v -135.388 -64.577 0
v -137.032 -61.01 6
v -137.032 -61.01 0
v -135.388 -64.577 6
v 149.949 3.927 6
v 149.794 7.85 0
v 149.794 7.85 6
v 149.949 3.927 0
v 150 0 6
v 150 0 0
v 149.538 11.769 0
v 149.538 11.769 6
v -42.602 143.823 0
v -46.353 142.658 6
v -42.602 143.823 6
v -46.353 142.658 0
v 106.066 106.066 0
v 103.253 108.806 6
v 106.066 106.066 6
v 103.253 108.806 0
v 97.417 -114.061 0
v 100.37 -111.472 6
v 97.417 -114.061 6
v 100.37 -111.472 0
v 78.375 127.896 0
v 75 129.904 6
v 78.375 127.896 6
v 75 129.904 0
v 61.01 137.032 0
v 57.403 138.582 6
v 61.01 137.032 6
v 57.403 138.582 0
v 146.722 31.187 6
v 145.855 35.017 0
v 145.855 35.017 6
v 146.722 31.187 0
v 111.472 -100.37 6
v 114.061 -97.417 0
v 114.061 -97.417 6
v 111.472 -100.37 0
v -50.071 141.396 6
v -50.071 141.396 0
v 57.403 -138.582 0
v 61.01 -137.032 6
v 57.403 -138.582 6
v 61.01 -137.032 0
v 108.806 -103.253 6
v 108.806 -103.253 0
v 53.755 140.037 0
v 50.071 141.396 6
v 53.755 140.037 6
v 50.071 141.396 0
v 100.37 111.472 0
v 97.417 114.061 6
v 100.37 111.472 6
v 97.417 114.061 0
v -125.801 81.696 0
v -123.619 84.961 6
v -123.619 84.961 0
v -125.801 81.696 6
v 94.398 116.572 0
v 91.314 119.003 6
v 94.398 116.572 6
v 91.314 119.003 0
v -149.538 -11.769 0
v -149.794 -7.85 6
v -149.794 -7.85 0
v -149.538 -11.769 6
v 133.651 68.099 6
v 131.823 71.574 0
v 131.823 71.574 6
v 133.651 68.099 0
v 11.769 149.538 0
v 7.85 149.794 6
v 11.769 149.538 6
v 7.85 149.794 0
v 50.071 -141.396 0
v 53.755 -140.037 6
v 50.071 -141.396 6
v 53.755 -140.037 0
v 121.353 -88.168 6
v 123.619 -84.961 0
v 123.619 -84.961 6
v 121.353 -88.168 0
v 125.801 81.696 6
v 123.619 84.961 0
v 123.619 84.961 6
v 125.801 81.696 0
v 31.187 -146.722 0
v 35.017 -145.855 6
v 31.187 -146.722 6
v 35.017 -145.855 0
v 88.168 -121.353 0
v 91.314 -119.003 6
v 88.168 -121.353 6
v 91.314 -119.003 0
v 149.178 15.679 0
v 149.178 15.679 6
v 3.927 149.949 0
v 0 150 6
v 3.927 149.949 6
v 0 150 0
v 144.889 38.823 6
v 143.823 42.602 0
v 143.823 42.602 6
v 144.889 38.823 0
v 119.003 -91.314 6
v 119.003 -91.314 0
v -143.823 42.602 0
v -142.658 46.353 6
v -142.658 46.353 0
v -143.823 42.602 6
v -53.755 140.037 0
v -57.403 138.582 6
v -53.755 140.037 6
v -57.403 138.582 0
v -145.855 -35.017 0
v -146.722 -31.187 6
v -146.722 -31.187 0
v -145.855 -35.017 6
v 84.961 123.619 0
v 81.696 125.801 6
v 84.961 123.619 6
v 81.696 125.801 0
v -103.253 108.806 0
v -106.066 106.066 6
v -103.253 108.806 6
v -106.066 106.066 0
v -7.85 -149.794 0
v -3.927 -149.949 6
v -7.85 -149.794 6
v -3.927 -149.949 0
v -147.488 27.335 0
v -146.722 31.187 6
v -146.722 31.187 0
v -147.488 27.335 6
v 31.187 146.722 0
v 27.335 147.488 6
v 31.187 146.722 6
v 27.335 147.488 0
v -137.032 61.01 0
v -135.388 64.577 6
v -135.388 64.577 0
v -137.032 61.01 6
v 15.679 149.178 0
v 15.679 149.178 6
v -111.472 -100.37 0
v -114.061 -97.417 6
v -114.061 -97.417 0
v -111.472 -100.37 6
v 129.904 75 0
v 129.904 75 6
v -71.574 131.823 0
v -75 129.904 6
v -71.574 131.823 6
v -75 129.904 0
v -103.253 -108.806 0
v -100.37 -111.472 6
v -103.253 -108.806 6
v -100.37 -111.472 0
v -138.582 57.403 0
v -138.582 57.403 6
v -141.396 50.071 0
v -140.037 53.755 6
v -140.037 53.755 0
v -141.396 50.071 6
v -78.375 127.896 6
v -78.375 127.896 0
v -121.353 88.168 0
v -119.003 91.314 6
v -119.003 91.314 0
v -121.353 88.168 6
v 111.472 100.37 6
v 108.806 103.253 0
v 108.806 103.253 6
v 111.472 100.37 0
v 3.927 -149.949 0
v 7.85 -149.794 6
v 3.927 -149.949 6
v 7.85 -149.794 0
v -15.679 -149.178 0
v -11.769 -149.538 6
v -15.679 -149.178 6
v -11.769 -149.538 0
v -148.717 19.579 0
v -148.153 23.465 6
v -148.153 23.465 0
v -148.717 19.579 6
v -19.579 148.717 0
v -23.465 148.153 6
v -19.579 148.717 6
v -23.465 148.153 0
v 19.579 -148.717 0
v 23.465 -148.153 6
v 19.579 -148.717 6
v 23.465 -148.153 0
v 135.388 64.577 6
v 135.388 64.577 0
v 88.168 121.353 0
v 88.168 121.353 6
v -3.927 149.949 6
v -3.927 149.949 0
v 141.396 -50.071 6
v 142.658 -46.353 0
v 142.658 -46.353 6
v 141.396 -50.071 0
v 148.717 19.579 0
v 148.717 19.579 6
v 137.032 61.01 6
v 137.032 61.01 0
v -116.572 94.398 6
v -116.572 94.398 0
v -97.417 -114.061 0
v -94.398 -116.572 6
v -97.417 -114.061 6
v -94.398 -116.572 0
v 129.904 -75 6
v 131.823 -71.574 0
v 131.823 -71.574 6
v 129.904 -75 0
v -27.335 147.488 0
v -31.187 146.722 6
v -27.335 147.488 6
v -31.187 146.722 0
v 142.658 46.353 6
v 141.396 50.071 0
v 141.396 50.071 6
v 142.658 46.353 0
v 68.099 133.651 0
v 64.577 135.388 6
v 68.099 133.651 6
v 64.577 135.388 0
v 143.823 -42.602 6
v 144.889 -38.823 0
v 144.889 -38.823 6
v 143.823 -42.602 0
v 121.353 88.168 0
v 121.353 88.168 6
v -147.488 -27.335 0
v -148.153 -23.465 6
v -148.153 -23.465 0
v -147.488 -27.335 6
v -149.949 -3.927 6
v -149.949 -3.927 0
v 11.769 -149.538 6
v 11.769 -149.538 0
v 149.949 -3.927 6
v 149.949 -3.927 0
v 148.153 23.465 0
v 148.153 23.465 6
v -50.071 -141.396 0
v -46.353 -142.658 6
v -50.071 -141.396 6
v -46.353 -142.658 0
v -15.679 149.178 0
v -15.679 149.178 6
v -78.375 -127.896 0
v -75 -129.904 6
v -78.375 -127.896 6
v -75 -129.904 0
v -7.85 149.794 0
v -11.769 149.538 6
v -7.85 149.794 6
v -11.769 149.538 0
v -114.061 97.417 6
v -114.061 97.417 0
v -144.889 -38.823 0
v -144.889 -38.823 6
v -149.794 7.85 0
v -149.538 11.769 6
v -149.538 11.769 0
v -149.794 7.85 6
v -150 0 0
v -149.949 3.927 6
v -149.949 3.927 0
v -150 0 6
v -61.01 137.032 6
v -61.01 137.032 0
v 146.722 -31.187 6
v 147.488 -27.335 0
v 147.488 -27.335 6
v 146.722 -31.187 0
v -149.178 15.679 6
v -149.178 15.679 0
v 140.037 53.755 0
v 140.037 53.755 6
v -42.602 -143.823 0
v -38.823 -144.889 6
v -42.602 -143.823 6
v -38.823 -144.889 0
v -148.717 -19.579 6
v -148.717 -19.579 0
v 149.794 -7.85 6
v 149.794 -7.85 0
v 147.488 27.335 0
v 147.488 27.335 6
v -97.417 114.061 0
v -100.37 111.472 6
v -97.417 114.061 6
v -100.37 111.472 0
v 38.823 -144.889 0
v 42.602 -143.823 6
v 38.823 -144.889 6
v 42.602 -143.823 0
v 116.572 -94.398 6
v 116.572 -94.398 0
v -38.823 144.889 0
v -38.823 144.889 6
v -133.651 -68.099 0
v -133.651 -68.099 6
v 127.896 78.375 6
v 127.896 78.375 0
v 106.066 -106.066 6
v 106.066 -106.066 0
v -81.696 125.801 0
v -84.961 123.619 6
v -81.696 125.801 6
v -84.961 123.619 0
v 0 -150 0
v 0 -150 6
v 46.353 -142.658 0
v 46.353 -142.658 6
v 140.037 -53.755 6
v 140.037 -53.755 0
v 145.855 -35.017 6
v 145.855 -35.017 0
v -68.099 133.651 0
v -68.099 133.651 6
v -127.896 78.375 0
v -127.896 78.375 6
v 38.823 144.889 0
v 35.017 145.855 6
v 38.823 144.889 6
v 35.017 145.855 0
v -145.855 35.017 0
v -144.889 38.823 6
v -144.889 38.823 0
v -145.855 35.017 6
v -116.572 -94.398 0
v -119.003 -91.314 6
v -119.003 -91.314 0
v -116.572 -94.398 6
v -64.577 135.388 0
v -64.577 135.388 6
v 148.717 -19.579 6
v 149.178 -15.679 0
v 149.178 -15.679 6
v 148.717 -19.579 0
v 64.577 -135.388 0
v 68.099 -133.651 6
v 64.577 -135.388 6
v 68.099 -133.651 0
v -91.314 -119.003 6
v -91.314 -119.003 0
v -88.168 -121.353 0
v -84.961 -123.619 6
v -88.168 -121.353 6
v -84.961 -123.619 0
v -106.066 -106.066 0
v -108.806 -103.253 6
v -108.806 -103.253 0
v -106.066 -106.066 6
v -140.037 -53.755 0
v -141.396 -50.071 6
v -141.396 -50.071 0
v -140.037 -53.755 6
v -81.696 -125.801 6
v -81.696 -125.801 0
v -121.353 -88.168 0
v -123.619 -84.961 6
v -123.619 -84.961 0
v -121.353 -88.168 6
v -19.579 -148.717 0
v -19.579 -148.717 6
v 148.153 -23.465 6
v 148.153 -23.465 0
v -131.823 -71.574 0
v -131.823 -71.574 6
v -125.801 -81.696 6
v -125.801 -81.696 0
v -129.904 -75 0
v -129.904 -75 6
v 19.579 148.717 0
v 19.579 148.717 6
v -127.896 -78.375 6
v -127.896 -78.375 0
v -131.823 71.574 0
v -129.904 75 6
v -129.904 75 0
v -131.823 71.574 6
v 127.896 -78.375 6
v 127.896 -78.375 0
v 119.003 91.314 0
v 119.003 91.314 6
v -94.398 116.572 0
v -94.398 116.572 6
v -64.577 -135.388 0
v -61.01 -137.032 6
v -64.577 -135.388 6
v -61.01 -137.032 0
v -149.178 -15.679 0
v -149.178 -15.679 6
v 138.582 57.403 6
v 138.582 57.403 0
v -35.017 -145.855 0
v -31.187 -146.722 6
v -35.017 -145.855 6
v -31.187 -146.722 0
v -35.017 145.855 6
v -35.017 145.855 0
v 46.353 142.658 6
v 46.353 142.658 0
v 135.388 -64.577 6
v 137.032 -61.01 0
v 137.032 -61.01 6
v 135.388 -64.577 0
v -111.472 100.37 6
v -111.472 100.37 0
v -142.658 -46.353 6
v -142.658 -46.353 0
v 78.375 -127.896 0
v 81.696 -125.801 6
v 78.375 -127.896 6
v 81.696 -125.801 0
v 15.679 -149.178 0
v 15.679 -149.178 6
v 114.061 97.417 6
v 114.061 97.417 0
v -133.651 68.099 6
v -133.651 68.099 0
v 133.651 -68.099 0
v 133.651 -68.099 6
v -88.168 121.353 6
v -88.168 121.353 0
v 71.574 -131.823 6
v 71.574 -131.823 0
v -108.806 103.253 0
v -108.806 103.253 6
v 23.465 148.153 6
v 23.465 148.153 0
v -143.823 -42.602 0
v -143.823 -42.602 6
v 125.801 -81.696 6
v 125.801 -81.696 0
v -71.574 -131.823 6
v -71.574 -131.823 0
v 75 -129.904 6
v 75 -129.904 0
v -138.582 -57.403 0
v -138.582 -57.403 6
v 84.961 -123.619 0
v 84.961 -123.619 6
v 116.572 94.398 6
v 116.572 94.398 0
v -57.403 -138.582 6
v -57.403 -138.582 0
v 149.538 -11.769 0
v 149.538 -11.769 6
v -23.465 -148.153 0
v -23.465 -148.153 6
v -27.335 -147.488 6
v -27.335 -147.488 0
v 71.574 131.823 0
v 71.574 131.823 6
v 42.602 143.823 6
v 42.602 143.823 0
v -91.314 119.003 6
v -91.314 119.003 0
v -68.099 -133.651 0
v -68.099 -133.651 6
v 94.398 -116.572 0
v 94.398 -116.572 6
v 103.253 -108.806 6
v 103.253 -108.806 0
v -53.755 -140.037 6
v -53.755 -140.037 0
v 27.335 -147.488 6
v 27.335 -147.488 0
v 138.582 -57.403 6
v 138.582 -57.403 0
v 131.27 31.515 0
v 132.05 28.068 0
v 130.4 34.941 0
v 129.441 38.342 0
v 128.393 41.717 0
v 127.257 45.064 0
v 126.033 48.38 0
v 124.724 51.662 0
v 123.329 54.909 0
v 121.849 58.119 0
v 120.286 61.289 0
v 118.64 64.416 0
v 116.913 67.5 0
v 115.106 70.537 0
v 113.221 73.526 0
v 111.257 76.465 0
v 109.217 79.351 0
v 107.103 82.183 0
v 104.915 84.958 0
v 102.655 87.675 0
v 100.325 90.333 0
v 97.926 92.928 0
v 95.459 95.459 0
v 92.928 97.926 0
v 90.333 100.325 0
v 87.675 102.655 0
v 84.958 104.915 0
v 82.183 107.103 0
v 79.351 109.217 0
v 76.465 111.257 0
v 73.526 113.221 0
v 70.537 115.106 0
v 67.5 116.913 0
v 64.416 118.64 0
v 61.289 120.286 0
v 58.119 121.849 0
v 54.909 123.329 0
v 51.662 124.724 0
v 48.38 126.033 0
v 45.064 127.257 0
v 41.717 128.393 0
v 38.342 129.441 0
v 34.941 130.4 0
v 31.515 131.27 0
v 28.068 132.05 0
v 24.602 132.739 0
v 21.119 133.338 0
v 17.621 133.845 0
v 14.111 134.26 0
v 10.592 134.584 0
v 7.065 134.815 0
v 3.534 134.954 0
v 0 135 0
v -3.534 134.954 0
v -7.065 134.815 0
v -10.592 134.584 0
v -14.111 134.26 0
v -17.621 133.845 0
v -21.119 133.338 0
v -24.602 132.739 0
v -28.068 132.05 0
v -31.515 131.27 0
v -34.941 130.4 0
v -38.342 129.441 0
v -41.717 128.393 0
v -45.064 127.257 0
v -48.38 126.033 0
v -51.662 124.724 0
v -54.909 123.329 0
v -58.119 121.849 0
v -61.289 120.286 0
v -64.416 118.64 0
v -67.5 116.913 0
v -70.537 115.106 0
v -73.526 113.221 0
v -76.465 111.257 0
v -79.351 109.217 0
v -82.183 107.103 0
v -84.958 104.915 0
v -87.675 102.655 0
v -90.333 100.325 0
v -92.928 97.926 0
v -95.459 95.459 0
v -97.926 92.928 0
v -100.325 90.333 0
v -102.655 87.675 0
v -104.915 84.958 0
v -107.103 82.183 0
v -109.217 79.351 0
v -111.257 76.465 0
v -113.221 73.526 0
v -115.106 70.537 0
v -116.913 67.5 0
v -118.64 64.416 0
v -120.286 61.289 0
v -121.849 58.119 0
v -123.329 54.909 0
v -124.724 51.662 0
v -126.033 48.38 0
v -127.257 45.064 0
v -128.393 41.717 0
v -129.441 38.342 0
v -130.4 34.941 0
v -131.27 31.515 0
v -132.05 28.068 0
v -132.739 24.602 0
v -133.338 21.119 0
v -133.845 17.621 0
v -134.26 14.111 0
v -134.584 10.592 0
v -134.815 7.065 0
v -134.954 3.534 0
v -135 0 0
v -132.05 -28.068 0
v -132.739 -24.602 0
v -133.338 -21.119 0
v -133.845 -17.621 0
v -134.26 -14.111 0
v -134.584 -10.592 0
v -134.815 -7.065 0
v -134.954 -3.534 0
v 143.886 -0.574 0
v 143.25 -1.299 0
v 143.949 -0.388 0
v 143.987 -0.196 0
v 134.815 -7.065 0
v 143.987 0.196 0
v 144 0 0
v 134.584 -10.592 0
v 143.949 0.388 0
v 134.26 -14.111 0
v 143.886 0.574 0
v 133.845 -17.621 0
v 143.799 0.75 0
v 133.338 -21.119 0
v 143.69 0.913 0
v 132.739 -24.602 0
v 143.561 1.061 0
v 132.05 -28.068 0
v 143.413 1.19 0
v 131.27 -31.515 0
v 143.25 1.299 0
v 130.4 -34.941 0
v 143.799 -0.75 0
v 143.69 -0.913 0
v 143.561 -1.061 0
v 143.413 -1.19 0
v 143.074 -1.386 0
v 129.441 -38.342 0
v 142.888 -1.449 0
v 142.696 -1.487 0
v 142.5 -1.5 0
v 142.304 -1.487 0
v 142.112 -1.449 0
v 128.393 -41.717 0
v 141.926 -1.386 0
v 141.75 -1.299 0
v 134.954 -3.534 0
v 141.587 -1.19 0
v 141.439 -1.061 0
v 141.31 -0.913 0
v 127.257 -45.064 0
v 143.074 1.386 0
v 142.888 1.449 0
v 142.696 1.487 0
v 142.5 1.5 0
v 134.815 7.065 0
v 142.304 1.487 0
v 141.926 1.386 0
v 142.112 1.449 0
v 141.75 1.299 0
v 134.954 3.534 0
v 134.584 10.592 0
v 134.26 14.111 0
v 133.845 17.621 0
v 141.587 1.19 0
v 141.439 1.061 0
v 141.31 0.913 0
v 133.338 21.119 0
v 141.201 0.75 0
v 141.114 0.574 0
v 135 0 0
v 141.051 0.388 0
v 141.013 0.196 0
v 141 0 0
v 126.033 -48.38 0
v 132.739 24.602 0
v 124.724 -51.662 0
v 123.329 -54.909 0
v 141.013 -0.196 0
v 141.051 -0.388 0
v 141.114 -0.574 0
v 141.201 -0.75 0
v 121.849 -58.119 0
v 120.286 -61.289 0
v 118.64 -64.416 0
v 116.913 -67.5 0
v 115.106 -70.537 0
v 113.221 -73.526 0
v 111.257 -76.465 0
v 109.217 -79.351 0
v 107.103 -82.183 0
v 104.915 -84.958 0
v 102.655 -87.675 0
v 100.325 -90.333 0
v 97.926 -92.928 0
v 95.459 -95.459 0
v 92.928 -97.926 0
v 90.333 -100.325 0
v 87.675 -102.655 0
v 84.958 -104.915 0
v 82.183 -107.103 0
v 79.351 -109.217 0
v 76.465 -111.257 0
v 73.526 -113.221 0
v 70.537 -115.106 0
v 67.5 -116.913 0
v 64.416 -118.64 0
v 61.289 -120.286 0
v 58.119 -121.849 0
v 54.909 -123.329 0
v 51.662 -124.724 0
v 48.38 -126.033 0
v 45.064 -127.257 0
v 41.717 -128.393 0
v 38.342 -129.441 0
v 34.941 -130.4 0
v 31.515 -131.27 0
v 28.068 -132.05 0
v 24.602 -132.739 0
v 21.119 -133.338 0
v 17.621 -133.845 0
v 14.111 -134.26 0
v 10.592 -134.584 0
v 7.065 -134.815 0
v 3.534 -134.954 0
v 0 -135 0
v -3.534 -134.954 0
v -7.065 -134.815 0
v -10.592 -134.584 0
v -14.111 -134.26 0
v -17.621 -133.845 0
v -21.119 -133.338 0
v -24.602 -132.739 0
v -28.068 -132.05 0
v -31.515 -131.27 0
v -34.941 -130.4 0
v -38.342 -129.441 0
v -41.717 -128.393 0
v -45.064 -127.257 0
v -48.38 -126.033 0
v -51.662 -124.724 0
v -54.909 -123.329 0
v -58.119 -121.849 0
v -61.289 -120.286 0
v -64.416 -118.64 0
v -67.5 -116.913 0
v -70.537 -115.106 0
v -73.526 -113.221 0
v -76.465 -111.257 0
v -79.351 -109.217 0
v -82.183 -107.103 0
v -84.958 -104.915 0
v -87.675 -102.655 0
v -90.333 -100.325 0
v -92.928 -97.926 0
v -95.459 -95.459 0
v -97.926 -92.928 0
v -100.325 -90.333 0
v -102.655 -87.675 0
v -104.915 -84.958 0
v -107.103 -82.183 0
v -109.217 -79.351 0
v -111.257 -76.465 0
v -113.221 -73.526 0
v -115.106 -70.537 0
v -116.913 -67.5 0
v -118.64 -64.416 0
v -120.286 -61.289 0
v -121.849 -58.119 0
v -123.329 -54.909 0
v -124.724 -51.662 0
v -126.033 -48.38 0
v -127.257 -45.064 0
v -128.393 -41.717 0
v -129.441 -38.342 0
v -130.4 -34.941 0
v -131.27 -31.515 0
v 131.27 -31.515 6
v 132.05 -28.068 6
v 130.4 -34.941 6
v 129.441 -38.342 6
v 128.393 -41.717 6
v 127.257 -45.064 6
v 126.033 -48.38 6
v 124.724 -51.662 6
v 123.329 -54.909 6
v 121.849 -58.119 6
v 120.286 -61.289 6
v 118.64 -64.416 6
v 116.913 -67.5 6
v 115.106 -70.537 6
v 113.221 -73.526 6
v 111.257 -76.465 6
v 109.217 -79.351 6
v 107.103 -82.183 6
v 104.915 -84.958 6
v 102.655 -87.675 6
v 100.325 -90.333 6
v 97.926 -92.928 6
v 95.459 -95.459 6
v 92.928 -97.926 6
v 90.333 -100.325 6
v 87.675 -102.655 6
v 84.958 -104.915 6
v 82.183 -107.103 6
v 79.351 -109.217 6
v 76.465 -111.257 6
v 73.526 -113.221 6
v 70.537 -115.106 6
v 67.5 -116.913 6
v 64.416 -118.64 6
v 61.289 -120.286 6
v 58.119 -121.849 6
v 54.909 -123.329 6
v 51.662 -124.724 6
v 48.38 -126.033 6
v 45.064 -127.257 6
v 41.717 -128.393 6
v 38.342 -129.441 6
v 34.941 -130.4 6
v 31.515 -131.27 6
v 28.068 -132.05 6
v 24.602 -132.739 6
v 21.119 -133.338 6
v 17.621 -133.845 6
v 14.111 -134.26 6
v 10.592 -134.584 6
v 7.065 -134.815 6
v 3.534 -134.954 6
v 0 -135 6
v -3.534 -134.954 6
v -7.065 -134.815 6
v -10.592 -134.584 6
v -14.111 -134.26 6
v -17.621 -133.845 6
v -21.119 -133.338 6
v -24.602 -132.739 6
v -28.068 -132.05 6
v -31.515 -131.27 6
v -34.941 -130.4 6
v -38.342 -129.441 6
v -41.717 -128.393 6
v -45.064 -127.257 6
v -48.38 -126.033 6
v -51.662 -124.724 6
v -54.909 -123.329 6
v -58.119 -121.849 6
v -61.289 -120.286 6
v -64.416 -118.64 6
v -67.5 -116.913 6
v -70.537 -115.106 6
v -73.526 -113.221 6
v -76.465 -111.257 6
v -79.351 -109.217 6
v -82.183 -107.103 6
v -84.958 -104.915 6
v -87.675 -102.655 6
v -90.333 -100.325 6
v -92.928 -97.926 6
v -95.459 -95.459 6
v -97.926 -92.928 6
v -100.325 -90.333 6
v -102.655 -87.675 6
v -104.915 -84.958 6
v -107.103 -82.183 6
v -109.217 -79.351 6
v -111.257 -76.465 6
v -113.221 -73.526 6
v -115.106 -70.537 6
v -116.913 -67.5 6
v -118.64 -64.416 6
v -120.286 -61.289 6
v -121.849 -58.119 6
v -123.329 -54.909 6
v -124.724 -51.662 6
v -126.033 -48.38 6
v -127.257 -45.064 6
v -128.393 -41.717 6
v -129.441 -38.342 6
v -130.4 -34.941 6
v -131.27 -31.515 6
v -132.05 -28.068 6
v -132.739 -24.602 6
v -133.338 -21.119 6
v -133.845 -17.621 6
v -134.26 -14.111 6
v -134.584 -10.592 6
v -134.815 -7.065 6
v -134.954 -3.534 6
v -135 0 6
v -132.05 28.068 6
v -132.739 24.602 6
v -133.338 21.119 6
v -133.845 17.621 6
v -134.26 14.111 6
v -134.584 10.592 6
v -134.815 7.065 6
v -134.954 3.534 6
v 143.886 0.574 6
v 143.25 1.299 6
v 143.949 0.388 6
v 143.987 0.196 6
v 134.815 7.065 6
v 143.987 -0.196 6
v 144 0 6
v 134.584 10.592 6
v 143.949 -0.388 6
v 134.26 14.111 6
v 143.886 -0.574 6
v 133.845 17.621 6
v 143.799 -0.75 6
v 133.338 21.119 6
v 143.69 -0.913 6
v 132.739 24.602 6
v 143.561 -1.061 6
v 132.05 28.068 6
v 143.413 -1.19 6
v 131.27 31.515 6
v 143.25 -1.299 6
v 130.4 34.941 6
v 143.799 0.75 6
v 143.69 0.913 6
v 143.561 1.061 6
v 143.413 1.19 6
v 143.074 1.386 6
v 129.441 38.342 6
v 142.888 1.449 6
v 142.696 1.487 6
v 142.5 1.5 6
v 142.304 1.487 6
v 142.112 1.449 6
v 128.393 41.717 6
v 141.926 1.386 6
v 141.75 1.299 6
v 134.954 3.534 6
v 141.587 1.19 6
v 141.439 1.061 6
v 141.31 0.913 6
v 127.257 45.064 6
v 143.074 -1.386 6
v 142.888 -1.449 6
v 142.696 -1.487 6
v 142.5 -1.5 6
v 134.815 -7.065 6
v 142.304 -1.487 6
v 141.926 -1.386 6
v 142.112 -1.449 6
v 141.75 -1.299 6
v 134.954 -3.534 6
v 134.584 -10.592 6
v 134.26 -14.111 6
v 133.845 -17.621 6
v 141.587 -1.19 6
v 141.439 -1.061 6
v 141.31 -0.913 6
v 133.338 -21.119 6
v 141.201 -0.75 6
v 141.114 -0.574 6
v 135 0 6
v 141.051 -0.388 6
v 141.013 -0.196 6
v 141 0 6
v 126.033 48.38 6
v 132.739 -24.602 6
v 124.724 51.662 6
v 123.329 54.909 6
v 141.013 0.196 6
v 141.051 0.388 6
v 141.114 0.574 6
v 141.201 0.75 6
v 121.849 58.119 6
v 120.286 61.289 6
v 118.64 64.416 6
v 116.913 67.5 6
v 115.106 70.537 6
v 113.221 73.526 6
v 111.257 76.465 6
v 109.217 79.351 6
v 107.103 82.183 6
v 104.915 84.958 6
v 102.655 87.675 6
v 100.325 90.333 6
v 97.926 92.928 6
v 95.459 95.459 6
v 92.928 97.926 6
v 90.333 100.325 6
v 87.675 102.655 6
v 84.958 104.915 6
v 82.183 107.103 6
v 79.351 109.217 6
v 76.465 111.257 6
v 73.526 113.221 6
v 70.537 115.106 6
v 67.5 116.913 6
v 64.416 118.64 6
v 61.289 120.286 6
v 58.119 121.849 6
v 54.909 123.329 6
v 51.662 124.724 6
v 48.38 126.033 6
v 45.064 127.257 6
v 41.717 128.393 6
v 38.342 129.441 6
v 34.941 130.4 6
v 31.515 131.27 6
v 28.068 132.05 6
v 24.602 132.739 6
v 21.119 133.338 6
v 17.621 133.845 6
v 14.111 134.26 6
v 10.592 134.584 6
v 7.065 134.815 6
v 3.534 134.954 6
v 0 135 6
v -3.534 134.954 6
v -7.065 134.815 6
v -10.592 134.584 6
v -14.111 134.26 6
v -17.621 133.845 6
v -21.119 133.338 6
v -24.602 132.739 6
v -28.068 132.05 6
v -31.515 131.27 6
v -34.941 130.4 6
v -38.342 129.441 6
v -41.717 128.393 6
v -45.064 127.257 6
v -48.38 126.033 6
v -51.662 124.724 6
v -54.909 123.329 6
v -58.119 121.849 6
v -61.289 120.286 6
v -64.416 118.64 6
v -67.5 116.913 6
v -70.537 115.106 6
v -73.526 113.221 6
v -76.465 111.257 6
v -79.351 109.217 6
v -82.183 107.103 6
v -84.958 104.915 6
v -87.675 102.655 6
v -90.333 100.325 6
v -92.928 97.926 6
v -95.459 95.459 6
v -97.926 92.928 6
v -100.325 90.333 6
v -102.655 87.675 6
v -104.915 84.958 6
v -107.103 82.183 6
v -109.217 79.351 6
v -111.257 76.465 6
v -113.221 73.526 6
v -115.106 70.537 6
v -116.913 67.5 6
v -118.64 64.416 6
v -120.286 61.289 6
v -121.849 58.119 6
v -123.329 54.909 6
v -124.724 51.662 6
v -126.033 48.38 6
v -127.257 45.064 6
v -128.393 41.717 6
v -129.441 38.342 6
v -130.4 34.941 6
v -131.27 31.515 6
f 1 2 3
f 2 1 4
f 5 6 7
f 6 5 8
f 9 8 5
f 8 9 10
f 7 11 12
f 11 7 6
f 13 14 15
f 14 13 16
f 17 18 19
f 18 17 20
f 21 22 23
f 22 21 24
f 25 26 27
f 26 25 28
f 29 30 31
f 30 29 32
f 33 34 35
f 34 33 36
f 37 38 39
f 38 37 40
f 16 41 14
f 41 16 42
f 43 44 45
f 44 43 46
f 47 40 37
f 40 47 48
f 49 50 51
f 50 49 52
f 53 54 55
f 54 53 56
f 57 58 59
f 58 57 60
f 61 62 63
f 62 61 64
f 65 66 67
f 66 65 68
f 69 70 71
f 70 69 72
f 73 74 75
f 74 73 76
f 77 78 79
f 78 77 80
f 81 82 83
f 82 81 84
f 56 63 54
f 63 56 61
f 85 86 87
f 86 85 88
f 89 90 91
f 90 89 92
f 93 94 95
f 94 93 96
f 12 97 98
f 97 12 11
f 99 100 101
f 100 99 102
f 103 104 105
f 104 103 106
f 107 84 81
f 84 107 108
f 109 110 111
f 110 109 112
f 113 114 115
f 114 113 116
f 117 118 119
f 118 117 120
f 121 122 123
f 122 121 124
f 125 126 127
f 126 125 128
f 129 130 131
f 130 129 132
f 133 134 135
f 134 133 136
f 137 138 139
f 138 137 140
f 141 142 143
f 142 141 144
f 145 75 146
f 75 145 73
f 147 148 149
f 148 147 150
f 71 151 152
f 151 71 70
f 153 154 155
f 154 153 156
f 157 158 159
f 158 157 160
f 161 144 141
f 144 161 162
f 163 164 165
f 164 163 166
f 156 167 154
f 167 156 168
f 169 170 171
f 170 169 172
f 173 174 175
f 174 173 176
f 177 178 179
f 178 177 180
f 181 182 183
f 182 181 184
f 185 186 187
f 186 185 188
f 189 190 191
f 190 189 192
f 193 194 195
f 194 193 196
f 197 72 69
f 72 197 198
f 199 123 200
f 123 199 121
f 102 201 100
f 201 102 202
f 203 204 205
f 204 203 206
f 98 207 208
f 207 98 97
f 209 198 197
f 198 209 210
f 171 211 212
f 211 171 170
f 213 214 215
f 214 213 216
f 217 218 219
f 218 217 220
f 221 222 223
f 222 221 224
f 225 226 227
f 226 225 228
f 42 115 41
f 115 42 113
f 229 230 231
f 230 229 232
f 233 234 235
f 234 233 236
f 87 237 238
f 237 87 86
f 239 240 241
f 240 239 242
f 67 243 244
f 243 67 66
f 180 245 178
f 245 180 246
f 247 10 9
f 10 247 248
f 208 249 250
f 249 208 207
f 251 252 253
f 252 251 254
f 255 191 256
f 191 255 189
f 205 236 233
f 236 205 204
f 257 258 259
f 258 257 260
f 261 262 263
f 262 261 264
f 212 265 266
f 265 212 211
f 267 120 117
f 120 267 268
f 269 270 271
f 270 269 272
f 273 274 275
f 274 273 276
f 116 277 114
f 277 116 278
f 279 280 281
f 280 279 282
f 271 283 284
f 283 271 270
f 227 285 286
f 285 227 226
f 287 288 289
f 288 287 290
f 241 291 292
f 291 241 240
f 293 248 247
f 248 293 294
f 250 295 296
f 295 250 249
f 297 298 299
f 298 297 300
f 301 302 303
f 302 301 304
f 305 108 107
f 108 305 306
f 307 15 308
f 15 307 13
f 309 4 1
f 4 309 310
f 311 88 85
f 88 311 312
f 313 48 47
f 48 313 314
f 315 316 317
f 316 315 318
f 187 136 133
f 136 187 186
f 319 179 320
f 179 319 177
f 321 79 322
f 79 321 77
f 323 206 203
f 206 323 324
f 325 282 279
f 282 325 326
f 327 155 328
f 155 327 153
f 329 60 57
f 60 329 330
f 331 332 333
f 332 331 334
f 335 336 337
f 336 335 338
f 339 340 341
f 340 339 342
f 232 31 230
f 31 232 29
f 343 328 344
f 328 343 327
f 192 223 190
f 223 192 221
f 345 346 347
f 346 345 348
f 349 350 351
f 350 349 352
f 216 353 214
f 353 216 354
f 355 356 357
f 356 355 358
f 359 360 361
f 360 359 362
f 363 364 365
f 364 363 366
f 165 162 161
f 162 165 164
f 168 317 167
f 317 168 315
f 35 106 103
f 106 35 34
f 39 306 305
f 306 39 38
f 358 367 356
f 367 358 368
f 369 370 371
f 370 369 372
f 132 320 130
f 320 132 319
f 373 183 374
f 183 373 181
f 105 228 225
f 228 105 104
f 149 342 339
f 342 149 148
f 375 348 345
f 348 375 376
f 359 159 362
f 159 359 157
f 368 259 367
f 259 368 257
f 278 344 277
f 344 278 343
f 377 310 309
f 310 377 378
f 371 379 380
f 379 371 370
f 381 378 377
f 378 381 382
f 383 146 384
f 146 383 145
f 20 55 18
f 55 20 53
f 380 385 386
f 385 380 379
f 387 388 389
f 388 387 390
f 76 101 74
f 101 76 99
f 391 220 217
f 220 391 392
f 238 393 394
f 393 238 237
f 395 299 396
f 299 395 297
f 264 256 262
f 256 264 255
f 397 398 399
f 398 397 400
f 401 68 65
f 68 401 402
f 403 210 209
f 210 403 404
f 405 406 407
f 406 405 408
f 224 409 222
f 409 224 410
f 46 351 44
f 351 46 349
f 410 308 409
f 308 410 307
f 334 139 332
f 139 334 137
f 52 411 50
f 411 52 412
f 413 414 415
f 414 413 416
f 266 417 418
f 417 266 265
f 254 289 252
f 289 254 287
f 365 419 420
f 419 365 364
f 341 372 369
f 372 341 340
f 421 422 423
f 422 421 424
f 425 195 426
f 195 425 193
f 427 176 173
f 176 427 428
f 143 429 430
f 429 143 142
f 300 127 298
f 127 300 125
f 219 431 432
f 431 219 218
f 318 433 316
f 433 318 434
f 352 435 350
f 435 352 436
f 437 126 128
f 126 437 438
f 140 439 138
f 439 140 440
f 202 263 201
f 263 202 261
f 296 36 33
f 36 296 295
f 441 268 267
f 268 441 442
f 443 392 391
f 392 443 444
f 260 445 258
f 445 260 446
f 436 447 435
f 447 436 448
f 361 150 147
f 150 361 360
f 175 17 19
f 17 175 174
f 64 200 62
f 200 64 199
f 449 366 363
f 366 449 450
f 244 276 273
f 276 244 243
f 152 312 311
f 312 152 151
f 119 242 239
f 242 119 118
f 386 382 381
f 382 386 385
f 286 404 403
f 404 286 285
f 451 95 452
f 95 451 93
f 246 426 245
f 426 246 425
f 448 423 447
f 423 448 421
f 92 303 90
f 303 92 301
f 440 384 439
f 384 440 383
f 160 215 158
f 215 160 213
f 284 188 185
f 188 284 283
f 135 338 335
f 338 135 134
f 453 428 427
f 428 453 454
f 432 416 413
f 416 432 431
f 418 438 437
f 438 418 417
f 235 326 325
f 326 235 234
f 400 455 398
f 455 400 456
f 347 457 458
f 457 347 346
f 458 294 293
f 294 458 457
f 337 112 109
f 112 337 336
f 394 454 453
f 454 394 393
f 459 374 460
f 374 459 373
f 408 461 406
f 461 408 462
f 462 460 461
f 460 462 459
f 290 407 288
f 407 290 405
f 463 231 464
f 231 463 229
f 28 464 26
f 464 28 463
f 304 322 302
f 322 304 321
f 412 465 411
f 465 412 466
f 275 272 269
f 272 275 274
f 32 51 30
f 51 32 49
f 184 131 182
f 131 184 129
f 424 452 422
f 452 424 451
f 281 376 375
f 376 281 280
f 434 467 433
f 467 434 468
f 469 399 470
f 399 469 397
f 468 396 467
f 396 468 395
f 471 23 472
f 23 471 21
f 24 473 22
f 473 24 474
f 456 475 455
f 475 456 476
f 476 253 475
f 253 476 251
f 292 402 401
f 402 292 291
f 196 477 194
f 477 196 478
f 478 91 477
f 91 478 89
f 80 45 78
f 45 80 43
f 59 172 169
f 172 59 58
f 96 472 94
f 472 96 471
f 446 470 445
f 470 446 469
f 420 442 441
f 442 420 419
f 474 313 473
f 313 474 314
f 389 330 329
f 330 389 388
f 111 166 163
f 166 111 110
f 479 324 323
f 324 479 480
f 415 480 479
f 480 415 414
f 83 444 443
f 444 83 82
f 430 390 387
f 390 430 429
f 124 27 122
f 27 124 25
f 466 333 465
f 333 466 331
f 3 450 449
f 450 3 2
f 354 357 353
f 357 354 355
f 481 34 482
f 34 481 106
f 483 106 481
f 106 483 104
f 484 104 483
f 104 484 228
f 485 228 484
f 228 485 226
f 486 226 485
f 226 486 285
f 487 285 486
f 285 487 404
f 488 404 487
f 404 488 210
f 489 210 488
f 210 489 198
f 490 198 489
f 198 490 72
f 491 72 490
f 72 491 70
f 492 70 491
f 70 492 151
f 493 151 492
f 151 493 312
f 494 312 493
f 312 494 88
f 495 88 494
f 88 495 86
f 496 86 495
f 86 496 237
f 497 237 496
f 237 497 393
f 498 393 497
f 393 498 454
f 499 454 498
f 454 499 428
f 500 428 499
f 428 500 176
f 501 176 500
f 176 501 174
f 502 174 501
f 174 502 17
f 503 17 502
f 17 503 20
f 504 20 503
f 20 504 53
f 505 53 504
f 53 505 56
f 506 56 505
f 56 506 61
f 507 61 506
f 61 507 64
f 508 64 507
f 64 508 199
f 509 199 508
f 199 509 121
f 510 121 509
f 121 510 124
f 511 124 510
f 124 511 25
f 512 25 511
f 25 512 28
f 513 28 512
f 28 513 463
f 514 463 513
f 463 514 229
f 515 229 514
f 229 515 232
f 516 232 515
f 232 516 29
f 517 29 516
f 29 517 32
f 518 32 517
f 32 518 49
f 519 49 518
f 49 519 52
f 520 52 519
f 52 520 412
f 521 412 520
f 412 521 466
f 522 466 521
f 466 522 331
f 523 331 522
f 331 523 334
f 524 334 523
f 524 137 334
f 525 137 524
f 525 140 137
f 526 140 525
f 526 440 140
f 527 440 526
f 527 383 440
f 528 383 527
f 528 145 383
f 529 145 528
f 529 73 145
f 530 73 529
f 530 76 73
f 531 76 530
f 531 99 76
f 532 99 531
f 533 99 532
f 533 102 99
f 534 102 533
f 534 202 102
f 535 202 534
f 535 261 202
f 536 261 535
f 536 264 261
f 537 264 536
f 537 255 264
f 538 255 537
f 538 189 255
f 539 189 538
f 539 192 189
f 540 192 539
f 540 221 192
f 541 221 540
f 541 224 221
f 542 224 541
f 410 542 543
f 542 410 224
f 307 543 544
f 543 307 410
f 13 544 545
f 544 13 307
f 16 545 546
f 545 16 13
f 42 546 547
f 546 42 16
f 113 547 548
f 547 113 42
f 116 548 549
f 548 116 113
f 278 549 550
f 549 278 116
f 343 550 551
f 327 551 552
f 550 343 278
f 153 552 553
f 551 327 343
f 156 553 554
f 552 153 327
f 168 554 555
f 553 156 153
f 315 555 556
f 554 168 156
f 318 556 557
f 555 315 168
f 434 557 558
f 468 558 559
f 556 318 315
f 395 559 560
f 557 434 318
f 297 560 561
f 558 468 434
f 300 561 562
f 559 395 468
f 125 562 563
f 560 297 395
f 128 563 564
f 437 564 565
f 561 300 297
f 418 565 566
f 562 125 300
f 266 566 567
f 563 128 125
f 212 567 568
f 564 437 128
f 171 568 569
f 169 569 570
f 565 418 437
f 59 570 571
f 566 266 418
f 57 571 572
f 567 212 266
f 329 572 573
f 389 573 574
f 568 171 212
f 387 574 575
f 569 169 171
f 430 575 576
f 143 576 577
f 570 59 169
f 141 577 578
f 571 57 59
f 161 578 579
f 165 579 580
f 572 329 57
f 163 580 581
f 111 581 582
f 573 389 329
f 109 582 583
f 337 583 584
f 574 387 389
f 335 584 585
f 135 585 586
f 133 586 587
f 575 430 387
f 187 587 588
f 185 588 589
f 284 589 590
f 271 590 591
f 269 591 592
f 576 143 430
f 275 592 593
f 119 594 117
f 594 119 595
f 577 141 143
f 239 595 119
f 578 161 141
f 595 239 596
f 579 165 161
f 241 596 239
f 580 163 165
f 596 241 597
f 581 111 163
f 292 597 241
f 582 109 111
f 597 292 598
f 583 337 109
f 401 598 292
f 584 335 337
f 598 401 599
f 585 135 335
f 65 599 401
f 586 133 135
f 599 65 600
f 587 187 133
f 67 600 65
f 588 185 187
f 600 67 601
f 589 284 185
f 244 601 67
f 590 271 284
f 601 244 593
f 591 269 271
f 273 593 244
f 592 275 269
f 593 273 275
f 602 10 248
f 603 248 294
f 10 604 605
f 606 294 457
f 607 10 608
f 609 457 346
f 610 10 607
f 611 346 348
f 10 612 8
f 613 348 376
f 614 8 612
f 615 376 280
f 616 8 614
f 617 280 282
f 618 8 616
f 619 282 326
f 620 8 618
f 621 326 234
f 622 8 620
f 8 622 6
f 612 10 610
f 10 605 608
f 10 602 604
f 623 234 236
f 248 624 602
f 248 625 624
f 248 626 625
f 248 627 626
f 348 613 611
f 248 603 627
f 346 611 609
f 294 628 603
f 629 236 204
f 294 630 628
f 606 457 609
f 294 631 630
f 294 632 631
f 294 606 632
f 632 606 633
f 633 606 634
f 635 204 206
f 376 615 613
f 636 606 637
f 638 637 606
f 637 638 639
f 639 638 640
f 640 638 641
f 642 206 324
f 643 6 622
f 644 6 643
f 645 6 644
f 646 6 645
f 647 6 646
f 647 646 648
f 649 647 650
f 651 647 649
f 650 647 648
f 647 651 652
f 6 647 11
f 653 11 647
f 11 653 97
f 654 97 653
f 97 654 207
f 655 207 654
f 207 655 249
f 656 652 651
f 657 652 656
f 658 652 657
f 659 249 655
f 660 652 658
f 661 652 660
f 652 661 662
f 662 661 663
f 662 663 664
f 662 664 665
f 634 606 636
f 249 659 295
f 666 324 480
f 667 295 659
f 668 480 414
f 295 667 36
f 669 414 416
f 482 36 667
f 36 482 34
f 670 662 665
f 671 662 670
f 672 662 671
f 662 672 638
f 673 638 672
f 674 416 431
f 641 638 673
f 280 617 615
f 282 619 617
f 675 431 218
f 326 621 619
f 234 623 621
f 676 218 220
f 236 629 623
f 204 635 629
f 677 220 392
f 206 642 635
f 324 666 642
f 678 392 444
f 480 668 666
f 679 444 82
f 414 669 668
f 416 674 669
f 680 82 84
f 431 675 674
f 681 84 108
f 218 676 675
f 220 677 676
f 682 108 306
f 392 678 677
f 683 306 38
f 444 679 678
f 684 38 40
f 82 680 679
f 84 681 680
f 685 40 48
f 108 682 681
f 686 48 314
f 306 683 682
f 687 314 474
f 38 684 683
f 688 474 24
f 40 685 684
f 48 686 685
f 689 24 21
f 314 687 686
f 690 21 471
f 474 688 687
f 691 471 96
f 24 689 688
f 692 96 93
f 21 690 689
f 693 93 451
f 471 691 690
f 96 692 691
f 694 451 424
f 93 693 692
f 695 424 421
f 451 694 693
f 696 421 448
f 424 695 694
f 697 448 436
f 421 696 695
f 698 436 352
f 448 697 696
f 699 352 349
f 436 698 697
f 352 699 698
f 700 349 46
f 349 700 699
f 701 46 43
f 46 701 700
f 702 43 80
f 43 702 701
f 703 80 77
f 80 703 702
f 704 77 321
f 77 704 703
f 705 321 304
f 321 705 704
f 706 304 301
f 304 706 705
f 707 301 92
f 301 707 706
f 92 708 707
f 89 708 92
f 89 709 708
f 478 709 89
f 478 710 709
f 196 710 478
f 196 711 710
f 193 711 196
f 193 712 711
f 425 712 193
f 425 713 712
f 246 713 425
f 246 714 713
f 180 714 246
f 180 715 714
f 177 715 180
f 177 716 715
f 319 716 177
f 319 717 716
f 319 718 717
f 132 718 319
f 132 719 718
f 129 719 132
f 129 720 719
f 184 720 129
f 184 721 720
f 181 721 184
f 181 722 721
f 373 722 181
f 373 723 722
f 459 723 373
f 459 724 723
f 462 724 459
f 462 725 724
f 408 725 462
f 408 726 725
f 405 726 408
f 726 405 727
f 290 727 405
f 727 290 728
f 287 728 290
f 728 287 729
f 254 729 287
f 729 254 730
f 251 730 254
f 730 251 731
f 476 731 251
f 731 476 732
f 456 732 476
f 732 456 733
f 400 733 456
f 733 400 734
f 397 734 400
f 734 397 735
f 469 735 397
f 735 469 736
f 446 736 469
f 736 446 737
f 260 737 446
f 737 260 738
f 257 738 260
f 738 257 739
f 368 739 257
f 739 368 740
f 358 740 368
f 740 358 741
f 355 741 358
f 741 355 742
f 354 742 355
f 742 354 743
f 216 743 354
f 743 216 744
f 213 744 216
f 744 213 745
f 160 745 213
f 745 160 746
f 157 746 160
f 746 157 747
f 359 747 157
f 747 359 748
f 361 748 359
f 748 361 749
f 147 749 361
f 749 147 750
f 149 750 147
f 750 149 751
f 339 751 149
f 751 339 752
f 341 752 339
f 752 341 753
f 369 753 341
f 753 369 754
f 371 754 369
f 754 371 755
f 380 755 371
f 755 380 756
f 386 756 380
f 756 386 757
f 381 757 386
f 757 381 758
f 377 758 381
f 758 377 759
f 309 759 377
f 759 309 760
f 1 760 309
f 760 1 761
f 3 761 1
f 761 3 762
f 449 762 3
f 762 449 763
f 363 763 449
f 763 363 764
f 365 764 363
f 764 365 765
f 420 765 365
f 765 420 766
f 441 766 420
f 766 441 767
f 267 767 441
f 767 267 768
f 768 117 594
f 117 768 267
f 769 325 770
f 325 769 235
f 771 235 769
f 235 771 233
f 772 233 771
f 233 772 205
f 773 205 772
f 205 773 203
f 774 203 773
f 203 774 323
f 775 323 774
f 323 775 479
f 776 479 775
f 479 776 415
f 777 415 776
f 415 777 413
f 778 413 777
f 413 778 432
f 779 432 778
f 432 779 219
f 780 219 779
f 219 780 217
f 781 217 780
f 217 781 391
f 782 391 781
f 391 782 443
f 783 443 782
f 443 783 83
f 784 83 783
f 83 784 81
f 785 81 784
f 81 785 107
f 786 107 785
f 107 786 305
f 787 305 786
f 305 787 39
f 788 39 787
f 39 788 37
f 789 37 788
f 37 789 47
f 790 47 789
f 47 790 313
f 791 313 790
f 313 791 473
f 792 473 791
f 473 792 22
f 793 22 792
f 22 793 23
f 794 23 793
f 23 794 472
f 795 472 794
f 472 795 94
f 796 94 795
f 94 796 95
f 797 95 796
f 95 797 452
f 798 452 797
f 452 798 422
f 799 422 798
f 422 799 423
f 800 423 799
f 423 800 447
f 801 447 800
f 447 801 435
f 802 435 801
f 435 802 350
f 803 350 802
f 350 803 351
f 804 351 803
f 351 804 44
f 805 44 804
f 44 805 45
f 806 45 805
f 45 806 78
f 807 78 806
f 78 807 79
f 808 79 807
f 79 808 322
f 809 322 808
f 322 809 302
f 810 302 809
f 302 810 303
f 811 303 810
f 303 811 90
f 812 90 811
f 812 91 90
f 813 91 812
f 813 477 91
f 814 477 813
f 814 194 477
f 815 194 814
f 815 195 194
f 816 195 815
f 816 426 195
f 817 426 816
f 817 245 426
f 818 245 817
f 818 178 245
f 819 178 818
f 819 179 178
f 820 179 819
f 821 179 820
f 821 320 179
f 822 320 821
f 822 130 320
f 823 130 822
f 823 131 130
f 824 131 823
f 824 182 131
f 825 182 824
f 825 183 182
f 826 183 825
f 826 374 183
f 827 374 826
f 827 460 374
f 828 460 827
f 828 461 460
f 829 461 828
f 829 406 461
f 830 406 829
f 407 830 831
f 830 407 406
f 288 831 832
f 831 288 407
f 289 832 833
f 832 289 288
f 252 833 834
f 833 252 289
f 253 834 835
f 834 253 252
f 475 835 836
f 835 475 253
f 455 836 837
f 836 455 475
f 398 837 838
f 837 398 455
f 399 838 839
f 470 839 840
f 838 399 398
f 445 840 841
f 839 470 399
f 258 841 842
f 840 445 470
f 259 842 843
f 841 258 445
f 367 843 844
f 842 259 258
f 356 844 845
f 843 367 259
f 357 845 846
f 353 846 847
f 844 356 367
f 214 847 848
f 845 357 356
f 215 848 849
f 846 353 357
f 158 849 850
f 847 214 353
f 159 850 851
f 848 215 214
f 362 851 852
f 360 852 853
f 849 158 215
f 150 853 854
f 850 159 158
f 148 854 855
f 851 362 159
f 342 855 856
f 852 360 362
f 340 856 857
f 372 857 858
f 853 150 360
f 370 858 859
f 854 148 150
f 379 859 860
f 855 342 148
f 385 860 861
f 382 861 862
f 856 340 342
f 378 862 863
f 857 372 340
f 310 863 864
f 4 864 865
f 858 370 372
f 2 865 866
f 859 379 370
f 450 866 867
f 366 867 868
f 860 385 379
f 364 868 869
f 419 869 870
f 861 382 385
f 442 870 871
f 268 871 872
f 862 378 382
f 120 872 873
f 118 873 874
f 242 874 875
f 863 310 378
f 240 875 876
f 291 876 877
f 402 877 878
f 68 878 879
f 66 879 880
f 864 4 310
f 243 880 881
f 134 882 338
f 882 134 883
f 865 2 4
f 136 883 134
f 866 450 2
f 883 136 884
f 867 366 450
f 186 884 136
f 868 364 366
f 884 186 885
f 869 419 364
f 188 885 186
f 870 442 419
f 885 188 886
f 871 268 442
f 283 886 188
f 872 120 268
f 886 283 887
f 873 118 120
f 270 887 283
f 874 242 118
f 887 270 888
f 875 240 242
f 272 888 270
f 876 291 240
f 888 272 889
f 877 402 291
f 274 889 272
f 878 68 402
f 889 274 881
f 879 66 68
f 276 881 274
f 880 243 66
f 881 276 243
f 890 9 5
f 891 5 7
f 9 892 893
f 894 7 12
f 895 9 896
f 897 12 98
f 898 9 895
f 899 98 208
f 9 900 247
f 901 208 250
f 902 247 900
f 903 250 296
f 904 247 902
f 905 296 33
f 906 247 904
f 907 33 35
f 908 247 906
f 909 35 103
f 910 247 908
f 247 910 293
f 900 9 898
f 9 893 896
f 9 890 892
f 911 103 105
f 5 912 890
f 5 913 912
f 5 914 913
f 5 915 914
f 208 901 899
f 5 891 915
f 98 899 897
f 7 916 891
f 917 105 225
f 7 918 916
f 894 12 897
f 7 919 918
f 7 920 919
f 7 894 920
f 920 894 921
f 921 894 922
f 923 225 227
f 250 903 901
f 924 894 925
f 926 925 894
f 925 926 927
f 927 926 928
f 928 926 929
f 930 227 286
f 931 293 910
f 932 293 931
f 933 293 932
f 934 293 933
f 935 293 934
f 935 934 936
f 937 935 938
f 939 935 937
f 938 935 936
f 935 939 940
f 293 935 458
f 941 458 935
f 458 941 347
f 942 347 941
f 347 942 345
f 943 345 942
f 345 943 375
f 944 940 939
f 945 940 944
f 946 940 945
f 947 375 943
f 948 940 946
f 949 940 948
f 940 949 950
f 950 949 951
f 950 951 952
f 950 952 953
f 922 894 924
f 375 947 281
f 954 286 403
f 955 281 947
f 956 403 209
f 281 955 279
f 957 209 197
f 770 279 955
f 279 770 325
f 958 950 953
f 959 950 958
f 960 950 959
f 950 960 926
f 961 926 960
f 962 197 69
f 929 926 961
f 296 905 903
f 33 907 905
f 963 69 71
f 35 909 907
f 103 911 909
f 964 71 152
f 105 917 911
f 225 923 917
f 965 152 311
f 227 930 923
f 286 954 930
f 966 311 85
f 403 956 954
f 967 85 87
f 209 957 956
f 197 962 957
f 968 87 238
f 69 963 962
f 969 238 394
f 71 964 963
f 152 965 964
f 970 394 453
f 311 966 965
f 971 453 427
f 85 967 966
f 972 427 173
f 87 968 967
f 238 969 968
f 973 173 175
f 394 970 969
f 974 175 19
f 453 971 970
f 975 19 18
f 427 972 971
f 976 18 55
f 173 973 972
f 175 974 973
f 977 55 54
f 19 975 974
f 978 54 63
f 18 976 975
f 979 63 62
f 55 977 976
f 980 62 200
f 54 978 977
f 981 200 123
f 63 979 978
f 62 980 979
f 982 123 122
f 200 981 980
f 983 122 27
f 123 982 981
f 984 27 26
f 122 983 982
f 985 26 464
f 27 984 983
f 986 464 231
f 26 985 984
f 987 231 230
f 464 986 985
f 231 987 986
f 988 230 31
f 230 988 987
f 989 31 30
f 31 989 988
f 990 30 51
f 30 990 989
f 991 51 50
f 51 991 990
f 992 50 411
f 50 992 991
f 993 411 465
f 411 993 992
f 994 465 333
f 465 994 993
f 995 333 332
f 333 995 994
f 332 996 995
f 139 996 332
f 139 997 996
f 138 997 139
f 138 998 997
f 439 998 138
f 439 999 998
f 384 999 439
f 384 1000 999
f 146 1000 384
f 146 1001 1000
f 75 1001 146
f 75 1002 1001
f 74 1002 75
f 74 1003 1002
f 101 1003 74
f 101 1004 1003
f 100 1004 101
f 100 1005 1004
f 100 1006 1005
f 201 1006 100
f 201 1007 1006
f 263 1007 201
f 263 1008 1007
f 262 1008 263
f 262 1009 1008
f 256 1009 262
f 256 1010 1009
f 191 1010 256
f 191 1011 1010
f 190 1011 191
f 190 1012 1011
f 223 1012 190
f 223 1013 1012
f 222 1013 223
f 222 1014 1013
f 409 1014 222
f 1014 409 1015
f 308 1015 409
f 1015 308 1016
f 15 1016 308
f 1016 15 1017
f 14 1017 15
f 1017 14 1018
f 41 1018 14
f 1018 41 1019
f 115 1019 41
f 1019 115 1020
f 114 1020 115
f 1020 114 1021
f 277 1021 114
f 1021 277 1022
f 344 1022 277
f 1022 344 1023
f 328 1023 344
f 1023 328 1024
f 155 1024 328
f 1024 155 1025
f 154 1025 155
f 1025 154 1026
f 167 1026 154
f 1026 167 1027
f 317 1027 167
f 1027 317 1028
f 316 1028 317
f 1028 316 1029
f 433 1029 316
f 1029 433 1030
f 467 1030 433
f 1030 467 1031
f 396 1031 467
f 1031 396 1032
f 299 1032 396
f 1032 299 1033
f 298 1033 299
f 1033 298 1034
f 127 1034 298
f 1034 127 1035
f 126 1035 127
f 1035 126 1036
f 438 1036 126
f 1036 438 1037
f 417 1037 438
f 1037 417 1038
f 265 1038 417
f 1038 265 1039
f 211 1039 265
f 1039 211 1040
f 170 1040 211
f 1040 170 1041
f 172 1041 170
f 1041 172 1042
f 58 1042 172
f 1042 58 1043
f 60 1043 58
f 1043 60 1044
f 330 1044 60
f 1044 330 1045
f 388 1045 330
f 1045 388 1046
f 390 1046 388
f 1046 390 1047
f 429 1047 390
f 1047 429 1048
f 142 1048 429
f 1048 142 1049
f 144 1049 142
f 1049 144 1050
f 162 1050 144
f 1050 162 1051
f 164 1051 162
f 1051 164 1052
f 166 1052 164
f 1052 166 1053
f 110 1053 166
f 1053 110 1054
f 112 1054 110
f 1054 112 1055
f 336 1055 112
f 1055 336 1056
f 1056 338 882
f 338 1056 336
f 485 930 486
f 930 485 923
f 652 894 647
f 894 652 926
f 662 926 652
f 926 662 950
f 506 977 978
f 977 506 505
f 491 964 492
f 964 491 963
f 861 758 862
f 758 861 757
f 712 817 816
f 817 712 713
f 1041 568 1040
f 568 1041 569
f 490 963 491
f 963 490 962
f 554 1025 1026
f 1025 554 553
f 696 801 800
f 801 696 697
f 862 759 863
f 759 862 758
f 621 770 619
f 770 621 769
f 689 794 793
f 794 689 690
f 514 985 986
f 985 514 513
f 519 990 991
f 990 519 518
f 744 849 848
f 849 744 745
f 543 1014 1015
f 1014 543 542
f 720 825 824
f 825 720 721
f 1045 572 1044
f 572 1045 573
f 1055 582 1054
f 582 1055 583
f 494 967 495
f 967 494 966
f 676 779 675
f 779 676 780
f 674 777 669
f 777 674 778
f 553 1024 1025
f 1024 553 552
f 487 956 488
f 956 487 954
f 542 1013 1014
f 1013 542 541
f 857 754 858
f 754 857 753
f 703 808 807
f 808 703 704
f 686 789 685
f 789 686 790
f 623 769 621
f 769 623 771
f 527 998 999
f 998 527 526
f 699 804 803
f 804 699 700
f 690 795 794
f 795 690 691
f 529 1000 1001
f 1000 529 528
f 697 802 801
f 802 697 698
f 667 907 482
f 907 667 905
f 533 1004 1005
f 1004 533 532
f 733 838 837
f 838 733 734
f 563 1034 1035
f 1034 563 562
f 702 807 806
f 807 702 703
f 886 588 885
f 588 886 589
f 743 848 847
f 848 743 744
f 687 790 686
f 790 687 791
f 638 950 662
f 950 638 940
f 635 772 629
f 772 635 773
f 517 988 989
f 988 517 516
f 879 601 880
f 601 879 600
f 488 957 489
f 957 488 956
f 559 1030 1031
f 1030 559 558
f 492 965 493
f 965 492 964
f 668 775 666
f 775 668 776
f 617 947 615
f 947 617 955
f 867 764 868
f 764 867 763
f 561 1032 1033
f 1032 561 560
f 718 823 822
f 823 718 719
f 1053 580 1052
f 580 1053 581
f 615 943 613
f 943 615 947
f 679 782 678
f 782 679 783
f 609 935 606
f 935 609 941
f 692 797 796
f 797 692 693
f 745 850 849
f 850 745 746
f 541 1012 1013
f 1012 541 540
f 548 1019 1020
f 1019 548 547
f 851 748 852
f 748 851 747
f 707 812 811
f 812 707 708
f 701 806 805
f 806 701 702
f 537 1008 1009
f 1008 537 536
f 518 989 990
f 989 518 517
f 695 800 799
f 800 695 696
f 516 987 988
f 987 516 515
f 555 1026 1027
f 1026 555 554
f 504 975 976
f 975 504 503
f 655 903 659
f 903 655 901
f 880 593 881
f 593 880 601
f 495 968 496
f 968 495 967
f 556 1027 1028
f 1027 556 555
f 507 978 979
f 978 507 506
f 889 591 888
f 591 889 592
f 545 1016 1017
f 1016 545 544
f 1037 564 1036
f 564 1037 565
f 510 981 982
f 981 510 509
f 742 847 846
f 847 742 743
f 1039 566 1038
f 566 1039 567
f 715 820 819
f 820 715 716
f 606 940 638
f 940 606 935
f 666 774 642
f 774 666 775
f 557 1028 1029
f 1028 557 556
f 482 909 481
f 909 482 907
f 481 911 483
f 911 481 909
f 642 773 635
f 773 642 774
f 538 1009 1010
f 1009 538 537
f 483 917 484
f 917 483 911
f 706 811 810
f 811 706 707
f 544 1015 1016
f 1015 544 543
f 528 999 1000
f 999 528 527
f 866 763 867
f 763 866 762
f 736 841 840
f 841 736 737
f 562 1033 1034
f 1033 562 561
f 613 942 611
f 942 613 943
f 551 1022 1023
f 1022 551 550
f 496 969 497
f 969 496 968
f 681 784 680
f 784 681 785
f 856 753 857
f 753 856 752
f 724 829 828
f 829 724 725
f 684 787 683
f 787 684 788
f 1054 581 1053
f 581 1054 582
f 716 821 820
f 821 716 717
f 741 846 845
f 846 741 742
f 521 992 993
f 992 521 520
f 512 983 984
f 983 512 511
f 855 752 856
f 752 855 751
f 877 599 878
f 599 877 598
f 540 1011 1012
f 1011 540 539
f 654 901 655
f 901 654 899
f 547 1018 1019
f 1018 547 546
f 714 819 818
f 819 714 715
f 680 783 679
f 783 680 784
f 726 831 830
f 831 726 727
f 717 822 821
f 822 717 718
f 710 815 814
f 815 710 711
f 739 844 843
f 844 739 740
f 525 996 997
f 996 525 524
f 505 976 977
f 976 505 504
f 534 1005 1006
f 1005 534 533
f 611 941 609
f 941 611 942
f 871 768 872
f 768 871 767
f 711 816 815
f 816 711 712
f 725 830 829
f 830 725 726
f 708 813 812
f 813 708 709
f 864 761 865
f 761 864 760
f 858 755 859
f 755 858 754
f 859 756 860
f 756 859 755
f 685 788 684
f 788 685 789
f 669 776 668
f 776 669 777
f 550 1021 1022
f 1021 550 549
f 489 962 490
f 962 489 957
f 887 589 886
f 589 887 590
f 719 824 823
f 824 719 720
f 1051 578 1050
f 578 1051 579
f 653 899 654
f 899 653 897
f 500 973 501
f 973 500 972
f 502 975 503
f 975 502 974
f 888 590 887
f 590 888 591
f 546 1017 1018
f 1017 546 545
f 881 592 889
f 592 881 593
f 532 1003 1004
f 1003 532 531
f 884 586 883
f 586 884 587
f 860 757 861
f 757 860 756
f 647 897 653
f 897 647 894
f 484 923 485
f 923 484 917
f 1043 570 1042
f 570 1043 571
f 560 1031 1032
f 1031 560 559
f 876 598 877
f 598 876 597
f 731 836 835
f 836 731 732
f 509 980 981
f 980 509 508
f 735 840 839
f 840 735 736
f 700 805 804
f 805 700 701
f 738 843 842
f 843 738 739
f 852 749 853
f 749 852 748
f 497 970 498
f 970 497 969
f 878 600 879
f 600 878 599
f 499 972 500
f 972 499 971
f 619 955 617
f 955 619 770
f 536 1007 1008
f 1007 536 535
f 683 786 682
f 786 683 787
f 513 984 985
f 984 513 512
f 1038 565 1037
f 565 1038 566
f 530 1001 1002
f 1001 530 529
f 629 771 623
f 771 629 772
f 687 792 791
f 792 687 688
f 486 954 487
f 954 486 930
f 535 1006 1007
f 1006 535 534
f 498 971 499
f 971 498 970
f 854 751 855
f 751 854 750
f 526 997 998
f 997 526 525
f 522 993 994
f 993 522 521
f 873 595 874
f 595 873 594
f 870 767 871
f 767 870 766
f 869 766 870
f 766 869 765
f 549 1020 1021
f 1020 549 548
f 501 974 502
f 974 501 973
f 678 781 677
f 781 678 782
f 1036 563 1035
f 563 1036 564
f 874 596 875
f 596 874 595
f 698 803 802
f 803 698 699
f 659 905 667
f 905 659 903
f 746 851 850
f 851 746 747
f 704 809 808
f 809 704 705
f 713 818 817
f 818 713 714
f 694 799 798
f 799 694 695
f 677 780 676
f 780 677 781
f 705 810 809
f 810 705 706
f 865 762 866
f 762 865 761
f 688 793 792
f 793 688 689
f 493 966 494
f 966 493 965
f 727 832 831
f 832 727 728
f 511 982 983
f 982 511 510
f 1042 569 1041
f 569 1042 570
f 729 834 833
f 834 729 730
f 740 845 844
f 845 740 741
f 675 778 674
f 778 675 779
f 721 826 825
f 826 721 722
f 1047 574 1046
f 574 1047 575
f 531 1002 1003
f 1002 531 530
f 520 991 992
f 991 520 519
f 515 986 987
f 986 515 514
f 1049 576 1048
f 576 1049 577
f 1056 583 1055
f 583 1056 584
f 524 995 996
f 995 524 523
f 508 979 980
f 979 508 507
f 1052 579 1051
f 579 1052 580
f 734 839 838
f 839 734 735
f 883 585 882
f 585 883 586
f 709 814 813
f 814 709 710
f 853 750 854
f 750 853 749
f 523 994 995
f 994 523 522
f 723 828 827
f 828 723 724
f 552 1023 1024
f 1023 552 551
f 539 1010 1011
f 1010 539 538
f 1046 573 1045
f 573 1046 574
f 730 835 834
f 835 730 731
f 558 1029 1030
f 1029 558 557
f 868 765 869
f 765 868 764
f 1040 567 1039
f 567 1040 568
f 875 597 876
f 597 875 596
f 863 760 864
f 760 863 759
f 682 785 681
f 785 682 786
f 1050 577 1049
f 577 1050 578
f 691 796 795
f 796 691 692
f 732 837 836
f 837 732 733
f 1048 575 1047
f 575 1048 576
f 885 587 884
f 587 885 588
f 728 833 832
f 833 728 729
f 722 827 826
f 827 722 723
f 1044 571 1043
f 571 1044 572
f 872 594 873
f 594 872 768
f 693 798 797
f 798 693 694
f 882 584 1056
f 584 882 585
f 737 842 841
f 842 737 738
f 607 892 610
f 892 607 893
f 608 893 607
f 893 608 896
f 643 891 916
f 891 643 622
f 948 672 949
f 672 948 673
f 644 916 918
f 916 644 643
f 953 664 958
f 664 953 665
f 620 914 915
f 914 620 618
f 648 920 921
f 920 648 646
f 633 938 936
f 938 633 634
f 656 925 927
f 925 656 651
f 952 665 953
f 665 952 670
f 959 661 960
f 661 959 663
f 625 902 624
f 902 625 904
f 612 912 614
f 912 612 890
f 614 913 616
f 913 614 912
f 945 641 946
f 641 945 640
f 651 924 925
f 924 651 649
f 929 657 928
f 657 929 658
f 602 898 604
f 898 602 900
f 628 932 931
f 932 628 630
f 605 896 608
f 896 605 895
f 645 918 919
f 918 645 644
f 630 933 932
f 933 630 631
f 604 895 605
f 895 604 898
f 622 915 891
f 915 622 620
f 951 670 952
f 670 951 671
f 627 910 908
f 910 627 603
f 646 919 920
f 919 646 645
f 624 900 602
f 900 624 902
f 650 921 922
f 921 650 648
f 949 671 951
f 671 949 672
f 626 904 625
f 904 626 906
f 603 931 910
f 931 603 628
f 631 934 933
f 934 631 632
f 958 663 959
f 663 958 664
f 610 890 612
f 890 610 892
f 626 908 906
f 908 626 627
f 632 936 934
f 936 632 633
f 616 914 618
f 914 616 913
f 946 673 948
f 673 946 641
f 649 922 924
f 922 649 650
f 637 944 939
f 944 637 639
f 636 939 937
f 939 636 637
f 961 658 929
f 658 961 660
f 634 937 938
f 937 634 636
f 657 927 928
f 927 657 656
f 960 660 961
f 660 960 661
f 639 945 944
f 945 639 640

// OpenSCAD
// P0 annular rotor generator
// Export one rotor at a time by setting od/id/thickness.

od = 300;       // mm
id = 270;       // mm
thickness = 6;  // mm
index_hole_d = 3;
index_radius = (od + id) / 4;

difference() {
    cylinder(h=thickness, d=od, $fn=240);
    translate([0,0,-1])
        cylinder(h=thickness+2, d=id, $fn=240);

    // Optional index hole for magnet/sensor marker.
    translate([index_radius,0,-1])
        cylinder(h=thickness+2, d=index_hole_d, $fn=48);
}
